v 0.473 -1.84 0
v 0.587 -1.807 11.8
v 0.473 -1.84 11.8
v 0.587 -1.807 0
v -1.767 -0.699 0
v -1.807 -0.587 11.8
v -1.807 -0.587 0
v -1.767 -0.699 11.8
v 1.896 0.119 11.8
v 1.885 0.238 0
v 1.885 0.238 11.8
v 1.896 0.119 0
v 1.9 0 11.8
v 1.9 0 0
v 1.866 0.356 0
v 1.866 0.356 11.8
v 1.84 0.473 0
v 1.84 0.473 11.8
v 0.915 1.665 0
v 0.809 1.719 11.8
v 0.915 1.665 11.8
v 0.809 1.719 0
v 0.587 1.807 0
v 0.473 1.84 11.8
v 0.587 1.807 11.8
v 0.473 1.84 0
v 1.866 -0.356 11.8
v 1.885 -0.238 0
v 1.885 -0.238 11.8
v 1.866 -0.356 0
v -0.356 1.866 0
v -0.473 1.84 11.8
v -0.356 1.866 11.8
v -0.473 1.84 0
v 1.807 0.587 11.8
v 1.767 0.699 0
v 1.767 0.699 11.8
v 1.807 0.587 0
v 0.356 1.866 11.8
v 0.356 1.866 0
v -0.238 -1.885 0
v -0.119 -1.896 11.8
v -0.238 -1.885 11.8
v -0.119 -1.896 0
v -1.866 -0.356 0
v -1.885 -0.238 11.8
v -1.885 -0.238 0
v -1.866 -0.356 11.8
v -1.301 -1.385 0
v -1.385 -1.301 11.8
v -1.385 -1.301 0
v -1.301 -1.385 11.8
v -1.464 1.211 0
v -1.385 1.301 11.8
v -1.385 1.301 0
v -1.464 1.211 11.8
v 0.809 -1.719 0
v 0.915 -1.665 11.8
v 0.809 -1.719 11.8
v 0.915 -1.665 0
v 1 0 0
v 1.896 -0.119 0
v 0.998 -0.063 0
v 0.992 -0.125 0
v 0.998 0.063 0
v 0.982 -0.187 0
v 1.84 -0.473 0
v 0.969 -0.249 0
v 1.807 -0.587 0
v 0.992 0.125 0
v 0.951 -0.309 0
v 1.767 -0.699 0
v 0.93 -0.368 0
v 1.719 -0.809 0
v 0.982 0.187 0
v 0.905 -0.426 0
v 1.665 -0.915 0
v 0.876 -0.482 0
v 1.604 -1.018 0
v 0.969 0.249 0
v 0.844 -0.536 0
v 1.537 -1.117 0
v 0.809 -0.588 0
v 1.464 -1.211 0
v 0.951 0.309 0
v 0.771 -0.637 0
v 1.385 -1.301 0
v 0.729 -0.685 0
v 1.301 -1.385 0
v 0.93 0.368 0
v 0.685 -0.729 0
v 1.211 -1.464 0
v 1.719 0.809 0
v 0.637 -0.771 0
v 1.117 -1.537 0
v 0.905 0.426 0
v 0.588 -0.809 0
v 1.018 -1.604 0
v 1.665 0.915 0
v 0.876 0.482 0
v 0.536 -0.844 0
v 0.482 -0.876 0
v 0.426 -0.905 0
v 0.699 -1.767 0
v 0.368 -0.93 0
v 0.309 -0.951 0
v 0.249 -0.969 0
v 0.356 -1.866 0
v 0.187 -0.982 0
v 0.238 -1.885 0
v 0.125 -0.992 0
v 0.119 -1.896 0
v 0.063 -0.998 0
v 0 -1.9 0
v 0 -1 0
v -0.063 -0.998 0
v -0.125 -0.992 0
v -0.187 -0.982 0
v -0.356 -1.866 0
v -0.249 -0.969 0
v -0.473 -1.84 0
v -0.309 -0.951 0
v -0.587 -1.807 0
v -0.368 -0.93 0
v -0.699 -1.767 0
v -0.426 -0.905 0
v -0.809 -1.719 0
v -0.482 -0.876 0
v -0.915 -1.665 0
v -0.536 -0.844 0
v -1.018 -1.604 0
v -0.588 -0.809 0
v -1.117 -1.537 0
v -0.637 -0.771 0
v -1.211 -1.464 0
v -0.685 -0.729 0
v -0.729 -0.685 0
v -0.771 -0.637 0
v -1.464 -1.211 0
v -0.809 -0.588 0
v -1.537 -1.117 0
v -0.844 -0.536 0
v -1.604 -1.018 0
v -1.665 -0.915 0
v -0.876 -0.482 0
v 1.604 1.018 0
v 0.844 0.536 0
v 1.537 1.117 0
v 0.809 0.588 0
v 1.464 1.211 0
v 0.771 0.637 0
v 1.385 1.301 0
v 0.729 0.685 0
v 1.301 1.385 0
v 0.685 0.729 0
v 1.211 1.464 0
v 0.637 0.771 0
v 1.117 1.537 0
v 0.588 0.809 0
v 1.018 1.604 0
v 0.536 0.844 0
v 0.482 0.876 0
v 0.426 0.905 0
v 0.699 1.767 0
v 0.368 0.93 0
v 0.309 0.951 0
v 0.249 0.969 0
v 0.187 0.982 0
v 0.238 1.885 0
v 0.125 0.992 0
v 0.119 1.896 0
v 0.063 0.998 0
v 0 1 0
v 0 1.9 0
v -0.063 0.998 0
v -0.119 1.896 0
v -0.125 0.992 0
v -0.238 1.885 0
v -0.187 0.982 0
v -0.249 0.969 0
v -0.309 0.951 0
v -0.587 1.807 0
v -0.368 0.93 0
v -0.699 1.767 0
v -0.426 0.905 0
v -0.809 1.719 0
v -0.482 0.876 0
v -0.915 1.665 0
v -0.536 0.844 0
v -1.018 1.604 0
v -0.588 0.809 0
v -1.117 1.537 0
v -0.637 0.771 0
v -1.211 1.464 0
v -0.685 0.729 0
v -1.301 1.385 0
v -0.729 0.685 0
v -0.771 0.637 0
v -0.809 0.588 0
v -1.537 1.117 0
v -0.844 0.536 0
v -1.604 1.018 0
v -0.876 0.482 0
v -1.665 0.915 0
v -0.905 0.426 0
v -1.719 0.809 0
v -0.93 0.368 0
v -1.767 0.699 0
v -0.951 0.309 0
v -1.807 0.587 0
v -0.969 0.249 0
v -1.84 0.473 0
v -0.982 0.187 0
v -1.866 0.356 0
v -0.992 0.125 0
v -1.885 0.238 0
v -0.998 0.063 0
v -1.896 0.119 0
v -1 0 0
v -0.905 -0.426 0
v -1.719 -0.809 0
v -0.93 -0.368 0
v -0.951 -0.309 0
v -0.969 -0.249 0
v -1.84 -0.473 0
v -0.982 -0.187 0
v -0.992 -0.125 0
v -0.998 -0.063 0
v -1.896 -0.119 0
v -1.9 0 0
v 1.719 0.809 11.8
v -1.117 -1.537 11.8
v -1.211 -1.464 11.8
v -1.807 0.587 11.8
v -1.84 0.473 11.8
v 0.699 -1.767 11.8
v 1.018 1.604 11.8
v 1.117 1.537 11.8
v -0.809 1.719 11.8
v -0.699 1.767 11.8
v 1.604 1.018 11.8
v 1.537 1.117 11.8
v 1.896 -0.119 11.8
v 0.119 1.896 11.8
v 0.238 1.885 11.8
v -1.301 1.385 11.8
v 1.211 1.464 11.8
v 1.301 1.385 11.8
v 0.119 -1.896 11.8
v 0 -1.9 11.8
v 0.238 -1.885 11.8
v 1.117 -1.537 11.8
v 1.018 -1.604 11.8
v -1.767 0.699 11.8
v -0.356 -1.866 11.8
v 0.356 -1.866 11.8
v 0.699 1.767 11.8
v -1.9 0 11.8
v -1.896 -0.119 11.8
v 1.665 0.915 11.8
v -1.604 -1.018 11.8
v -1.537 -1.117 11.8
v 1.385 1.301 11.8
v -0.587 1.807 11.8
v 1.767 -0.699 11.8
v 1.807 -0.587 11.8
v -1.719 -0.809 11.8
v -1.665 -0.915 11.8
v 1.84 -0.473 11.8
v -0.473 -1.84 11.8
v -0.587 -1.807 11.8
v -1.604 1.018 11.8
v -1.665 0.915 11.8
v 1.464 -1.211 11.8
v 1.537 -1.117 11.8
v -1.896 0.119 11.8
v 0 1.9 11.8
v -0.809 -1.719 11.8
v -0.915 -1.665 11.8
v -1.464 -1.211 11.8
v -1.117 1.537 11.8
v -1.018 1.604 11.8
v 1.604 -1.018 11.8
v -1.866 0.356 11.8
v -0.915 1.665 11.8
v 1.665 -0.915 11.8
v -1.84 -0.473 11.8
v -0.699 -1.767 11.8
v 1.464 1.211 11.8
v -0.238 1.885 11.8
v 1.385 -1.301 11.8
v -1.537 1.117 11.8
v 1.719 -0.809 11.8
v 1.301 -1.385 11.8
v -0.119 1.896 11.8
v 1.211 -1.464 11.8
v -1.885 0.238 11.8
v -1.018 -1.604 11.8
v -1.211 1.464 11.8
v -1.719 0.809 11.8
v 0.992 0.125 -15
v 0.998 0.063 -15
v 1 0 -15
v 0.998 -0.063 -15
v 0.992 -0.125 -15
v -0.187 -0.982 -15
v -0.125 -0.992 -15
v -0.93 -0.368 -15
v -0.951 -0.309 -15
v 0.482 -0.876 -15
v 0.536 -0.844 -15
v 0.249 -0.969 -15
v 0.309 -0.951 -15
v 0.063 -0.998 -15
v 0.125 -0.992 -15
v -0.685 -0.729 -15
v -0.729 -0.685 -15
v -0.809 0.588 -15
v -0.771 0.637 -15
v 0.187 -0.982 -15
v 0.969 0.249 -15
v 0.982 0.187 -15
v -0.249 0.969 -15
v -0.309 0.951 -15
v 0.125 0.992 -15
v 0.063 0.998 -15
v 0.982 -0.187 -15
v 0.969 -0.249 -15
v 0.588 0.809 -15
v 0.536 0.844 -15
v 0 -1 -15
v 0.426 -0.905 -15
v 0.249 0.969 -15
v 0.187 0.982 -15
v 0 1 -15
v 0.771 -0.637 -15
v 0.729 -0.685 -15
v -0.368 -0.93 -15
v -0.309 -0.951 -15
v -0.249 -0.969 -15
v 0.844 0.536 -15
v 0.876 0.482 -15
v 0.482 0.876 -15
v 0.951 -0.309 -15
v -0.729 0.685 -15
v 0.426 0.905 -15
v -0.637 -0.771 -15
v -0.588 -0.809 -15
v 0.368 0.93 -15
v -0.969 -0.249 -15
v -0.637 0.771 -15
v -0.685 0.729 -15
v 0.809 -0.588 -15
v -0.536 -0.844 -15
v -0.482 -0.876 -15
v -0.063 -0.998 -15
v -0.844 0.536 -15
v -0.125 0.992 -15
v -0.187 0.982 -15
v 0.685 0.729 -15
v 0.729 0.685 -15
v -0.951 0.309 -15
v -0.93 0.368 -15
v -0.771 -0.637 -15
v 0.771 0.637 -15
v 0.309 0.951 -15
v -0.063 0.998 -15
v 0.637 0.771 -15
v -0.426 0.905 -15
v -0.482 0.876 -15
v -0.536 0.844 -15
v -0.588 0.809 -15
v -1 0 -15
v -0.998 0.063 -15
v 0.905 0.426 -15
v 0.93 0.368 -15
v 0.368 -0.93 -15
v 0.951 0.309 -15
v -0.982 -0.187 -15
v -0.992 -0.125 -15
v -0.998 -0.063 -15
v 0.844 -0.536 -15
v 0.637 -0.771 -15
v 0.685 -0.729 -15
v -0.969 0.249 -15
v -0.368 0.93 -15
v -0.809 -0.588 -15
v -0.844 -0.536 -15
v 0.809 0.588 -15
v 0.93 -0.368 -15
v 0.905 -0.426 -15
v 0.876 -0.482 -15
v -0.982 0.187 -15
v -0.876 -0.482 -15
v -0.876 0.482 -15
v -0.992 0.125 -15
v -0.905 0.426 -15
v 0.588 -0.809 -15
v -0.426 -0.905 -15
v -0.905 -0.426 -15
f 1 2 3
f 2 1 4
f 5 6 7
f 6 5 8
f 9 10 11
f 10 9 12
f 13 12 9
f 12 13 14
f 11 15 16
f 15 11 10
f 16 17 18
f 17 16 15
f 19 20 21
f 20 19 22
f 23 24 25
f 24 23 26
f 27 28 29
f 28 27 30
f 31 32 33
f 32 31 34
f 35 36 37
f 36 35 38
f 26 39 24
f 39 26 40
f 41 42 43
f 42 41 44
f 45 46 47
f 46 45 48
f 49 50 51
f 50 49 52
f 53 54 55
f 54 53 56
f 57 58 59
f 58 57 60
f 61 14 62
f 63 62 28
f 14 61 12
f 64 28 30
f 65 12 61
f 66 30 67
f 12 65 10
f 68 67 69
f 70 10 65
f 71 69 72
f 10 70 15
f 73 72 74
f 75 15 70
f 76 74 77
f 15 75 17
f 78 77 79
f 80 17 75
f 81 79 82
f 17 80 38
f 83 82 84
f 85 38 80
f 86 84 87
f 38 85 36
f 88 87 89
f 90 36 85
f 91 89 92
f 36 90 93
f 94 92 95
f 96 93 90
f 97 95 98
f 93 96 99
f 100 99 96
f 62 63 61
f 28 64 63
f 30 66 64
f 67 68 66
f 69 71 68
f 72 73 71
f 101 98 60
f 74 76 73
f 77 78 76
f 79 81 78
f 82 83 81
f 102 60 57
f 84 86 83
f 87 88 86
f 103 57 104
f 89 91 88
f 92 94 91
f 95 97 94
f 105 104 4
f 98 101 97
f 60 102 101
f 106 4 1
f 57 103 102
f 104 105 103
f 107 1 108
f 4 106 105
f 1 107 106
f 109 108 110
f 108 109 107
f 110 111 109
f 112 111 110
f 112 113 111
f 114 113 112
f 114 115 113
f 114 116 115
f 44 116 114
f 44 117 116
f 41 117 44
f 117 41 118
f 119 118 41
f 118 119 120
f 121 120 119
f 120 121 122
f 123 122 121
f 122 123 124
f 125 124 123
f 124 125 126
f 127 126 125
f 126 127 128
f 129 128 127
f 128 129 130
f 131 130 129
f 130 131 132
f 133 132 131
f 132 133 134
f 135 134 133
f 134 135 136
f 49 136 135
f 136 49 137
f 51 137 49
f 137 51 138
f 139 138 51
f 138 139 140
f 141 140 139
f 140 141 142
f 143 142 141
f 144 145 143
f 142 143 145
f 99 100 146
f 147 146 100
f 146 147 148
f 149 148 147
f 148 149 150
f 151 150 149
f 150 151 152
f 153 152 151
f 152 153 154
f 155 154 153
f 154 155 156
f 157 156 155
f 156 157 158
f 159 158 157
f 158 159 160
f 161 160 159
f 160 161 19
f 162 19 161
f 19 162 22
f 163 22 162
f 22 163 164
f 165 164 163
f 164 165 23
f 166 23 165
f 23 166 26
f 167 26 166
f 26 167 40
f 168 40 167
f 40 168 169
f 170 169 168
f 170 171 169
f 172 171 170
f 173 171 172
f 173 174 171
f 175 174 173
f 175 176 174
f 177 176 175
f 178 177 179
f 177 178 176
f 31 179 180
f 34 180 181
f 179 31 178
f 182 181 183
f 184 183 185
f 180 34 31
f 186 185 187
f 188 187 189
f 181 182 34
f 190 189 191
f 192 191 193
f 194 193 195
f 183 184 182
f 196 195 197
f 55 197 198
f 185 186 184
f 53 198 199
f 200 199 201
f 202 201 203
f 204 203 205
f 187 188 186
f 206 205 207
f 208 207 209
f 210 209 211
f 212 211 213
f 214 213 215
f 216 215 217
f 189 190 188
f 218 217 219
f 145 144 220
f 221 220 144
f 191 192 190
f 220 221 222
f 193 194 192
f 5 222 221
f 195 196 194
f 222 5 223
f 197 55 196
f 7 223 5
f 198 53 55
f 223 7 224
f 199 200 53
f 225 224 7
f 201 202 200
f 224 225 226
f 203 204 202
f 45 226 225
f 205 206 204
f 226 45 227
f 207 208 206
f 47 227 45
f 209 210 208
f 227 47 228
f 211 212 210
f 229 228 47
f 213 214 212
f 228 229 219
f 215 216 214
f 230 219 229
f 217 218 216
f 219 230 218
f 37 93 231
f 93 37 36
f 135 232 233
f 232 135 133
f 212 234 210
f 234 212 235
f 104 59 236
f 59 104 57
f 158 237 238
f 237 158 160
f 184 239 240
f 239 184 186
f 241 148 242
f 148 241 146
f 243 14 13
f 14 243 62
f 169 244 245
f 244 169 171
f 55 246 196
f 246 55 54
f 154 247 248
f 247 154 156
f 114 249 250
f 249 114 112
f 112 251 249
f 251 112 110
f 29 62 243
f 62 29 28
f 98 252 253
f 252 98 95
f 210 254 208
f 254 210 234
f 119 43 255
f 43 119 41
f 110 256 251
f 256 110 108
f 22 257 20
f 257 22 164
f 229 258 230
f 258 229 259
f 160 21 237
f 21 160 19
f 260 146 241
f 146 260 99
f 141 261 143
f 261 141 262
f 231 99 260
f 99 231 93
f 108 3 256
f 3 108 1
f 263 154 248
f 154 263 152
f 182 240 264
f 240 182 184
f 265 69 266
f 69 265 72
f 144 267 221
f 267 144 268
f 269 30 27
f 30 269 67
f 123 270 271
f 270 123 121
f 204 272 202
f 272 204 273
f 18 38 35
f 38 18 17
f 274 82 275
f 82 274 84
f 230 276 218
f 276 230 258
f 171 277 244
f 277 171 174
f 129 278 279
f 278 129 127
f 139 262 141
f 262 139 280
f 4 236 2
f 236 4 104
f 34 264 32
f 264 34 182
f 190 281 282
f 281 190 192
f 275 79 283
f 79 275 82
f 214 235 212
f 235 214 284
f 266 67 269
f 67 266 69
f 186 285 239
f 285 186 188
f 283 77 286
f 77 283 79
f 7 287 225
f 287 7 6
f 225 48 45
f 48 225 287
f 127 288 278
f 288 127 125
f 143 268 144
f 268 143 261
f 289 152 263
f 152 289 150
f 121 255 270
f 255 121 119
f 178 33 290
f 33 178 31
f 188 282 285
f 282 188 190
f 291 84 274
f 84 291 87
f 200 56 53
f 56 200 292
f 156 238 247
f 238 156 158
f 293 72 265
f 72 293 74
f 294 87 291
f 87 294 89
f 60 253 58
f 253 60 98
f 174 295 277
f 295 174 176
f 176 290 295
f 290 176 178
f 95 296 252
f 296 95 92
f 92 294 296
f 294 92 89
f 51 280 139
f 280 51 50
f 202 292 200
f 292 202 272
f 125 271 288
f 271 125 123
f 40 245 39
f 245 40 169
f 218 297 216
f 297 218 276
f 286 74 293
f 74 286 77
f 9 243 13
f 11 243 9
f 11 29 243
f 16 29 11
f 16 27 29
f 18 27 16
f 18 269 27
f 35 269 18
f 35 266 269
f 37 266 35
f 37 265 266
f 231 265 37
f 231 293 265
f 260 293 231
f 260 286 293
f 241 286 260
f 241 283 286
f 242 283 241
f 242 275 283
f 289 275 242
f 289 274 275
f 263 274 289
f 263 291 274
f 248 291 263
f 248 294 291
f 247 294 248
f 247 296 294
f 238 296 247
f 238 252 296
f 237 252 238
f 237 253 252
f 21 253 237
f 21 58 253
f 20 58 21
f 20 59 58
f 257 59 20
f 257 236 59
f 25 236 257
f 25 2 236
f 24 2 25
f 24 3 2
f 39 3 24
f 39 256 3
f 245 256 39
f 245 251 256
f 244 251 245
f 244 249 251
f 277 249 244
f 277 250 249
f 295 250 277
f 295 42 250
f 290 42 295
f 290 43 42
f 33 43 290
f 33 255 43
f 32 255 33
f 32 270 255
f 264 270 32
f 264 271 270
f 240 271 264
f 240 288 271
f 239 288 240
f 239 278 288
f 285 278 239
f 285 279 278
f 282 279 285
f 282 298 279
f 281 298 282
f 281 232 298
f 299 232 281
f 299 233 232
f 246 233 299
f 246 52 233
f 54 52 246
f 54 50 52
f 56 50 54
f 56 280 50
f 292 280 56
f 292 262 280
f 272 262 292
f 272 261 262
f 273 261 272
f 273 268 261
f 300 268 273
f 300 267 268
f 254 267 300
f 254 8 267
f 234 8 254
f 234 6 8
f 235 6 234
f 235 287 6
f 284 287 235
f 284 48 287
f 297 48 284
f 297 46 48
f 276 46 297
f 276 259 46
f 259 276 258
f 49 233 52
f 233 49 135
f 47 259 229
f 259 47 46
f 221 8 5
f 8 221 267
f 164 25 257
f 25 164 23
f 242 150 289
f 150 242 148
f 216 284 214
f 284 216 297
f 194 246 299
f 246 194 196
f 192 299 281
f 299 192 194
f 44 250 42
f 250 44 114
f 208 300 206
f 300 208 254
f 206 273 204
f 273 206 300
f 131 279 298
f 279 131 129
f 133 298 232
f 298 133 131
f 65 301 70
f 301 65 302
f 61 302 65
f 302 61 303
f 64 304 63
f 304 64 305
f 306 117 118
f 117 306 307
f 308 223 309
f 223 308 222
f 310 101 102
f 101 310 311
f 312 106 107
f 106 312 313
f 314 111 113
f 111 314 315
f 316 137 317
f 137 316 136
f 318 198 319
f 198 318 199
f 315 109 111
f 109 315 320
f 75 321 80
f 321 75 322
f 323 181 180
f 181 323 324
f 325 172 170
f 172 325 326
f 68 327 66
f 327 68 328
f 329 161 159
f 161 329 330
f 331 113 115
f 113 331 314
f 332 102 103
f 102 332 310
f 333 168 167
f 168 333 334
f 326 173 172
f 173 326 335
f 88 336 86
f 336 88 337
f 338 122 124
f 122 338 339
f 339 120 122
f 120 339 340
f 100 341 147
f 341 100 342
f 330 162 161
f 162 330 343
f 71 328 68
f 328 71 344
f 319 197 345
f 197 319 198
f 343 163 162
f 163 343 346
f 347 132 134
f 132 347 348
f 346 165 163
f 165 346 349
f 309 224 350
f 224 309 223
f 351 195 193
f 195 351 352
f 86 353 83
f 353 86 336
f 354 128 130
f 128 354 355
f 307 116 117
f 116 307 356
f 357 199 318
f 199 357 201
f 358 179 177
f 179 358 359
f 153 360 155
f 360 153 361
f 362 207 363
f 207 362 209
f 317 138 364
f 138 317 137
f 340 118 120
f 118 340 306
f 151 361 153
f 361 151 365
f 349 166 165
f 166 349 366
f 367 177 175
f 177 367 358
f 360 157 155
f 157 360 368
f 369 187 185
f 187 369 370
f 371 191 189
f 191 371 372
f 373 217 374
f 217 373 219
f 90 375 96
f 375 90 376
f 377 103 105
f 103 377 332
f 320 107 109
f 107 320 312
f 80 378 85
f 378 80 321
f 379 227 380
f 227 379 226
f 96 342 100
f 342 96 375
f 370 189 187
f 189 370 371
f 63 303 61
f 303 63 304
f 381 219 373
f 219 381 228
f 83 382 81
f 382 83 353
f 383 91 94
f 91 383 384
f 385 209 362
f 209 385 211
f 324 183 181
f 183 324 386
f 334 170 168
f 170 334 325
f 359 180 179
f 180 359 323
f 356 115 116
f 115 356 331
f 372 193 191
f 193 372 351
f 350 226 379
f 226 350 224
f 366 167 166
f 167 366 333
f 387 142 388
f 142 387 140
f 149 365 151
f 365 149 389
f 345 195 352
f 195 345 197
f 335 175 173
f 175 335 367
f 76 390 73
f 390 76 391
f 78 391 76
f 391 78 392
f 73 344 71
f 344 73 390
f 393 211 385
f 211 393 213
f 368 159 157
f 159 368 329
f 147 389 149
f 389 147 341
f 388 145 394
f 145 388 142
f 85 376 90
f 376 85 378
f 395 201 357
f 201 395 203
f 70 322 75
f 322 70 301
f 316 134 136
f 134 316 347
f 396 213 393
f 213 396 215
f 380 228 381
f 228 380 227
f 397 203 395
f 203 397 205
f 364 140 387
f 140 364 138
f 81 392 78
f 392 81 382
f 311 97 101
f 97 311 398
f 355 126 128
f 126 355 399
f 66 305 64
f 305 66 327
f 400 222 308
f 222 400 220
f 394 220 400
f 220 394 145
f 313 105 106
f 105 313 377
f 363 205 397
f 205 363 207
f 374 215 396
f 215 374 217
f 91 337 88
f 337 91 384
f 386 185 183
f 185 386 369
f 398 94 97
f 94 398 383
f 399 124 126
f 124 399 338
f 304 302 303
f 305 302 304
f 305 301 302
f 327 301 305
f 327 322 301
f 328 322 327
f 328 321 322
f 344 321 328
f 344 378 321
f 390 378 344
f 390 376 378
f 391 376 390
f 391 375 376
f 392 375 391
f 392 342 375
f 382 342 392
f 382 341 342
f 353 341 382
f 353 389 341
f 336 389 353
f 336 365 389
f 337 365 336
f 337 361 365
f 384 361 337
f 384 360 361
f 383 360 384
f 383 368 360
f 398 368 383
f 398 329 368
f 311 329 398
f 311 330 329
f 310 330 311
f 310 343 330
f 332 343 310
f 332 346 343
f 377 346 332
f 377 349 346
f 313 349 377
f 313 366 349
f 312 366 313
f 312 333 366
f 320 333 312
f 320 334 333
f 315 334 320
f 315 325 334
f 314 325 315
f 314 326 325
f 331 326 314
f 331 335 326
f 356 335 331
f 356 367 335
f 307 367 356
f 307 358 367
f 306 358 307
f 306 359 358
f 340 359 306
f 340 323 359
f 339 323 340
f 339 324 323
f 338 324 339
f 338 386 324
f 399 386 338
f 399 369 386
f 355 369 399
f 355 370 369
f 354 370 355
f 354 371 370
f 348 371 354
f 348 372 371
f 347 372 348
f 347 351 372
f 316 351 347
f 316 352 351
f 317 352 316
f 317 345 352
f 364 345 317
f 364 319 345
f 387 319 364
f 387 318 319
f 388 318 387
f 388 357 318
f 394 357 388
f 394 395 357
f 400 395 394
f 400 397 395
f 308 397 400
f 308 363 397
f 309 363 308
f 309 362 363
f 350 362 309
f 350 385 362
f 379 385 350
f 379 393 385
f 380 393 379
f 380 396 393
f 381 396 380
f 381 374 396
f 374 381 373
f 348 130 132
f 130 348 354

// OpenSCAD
module screw_2sd_5l_4hd(head_buffer=0, shaft_buffer=0, extra_length=0){
    //2mm shaft diameter
    //5mm length
    //4mm head diameter
    cylinder(d=3.8+head_buffer, h=1.8+extra_length, $fn=100);
    translate([0,0,-5-extra_length])
    cylinder(d=2+shaft_buffer, h=5+extra_length, $fn=100);
}

screw_2sd_5l_4hd(extra_length=10);
